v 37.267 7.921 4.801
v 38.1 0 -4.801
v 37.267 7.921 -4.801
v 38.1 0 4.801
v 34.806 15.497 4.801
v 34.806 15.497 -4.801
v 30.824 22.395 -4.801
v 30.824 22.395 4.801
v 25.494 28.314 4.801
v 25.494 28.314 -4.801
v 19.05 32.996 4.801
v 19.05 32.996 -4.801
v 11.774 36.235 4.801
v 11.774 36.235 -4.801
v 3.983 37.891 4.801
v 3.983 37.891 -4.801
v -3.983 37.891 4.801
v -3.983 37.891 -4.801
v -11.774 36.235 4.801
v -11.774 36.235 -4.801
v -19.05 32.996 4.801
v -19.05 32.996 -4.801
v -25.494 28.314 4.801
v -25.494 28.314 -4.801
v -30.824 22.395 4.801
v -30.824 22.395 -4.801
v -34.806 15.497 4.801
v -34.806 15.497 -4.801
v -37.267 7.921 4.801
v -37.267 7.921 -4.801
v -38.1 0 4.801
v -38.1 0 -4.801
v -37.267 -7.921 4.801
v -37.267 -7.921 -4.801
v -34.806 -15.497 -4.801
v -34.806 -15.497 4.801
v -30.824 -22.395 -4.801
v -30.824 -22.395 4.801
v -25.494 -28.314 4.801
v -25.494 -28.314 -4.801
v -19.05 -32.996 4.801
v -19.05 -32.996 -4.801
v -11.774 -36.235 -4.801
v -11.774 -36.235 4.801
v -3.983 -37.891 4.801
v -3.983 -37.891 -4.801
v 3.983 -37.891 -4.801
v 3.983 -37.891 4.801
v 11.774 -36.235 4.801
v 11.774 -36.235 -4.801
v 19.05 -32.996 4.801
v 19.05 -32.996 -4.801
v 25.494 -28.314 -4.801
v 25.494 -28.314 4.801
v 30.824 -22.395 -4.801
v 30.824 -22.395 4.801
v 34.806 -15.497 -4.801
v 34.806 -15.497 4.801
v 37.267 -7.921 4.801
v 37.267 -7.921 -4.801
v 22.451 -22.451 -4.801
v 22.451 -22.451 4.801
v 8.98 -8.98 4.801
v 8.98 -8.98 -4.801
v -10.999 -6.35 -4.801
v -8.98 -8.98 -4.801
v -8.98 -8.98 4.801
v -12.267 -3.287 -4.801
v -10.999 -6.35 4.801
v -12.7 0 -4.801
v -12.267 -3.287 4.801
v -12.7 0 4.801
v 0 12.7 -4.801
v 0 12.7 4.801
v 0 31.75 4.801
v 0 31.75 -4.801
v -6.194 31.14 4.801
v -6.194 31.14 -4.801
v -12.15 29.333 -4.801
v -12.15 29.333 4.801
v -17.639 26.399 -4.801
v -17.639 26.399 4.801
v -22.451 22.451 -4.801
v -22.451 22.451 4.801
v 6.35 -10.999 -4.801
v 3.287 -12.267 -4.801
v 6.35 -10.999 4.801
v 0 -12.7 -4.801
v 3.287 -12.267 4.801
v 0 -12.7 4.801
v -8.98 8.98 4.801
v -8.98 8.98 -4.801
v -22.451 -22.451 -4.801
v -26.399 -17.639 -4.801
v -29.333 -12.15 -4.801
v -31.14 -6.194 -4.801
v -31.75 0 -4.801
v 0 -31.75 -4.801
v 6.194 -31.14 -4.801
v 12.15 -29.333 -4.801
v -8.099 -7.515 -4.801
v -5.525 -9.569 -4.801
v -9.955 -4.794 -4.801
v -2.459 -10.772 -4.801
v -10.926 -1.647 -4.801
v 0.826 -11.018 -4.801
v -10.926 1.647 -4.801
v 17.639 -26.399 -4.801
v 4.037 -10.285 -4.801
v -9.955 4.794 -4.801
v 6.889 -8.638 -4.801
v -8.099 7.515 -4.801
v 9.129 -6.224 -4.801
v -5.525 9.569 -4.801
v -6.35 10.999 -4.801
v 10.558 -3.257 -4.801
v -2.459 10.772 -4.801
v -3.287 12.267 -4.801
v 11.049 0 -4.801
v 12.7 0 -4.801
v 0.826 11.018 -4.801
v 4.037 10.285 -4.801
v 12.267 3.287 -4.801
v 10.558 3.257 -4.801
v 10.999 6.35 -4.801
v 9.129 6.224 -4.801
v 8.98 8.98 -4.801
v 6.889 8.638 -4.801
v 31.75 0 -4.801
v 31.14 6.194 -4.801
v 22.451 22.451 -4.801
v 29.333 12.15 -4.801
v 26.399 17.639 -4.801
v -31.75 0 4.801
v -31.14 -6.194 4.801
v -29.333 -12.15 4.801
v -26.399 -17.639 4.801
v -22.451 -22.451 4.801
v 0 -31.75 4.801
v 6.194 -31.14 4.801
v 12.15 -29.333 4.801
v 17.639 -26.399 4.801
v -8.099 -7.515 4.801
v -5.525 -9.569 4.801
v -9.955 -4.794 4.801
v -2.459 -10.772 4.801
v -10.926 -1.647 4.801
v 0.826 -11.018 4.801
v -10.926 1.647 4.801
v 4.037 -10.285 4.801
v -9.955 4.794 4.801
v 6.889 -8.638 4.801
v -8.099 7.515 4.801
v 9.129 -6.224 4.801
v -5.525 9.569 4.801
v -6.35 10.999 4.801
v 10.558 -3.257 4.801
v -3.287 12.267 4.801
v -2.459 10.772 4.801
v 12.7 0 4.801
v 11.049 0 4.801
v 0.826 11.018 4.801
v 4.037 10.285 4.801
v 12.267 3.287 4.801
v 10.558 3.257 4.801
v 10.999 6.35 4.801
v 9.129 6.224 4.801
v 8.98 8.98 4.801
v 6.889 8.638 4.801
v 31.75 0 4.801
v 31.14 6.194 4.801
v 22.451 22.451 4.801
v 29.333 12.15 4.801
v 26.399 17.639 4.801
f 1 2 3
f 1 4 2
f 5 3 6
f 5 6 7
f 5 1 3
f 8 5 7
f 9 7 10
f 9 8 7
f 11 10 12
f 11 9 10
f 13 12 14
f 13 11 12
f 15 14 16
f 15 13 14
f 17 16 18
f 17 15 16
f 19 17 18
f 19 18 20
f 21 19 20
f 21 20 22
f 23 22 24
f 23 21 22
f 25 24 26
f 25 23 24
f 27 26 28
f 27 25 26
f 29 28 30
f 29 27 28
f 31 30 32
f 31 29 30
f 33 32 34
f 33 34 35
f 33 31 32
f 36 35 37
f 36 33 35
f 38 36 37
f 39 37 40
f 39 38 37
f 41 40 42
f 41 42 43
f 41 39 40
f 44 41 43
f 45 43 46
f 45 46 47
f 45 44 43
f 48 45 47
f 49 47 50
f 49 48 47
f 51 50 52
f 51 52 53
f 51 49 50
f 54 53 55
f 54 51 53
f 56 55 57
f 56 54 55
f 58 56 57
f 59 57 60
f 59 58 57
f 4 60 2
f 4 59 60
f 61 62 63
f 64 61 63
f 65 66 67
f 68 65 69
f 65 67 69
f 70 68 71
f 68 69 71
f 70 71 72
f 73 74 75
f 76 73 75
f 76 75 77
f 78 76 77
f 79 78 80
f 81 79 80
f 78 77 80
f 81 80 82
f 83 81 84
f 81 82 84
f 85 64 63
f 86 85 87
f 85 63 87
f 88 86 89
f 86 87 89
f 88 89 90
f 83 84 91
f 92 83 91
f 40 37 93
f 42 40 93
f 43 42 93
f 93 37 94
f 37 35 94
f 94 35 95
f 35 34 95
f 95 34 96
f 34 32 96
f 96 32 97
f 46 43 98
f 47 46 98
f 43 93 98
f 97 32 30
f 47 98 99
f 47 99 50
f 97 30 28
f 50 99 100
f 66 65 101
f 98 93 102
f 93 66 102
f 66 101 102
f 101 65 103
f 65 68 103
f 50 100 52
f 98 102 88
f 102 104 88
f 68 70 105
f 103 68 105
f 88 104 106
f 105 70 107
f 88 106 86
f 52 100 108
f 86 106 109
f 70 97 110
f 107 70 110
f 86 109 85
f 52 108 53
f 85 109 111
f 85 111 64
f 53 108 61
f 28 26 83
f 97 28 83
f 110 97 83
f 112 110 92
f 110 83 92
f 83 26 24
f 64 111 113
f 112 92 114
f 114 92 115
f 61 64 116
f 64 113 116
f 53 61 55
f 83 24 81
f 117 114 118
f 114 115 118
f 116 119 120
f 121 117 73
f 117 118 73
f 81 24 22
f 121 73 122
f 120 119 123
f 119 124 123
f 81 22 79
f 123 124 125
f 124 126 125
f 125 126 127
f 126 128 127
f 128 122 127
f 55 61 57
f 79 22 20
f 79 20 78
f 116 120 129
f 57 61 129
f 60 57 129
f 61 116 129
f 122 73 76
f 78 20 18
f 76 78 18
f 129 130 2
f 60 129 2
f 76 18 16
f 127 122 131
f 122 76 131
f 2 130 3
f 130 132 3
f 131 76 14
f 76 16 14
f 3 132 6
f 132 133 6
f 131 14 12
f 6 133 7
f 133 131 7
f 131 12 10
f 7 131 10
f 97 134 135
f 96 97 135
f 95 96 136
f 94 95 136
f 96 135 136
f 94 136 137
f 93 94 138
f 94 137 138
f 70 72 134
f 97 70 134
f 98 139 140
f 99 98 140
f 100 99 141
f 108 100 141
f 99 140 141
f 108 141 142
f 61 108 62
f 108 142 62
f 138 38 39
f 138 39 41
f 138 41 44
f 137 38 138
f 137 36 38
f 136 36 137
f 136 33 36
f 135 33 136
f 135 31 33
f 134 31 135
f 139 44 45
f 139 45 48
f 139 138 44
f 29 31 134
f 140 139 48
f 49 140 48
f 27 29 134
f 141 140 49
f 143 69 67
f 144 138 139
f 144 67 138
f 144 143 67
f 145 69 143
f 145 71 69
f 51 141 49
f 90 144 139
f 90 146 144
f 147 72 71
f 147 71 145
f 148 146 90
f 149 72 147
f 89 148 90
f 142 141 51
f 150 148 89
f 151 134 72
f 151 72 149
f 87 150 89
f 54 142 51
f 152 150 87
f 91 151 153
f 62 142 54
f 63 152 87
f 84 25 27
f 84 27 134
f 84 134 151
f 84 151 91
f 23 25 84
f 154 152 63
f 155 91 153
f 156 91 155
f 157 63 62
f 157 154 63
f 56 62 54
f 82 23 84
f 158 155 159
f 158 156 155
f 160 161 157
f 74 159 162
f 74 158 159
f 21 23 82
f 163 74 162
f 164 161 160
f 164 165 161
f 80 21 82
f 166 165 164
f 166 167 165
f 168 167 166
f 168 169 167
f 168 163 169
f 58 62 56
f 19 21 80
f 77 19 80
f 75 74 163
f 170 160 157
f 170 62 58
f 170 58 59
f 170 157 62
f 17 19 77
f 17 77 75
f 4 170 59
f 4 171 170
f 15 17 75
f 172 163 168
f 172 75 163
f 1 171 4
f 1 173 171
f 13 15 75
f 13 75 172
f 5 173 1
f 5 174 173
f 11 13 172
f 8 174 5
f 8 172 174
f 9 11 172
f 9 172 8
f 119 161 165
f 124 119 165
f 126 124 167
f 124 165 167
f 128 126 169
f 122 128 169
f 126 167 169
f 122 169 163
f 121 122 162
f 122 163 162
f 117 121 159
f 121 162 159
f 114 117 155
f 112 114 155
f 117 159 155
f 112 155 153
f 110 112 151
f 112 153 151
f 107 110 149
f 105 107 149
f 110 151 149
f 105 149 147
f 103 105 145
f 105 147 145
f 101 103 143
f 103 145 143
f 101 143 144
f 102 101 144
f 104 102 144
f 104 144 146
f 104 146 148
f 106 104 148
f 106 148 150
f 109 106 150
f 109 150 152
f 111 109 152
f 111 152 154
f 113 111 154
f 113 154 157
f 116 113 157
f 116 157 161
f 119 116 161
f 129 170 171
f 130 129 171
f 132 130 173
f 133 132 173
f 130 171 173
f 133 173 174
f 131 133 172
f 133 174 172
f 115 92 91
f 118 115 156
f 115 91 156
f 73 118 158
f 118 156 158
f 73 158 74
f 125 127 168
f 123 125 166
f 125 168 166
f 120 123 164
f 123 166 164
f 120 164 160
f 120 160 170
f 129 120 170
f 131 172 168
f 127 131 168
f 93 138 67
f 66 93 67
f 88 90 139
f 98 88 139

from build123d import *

# Parameters (mm, degrees)
F0_R     = 38.1
F1_DEPTH = 4.8006
F3_R     = 11.049
F4_DEPTH = 25.4
F5_DEPTH = 25.4


with BuildPart() as f1:
    # F0 (on Top) → F1 (new body, symmetric)
    with BuildSketch(Plane.XY):
        Circle(F0_R)
    extrude(amount=F1_DEPTH, both=True)

    # F3 (on face) → F4 (cut)
    with BuildSketch(Plane.XY.offset(4.8006)):
        Circle(F3_R)
    extrude(amount=-F4_DEPTH, mode=Mode.SUBTRACT)

    # F2 (on face) → F5 (cut)
    with BuildSketch(Plane.XY.offset(4.8006)):
        with BuildLine():
            ThreePointArc((17.9605122421, 17.9605122421), (23.4665401258, 9.7201591821), (25.4, 0))
            Line((25.4, 0), (31.75, 0))
            ThreePointArc((31.75, 0), (29.3331751572, 12.1501989776), (22.4506403027, 22.4506403027))
            Line((22.4506403027, 22.4506403027), (17.9605122421, 17.9605122421))
        make_face()
        with BuildLine():
            ThreePointArc((-17.9605122421, 17.9605122421), (-9.7201591821, 23.4665401258), (0, 25.4))
            Line((0, 25.4), (0, 31.75))
            ThreePointArc((0, 31.75), (-12.1501989776, 29.3331751572), (-22.4506403027, 22.4506403027))
            Line((-22.4506403027, 22.4506403027), (-17.9605122421, 17.9605122421))
        make_face()
        with BuildLine():
            Line((-22.4506403027, -22.4506403027), (-17.9605122421, -17.9605122421))
            ThreePointArc((-17.9605122421, -17.9605122421), (-23.4665401258, -9.7201591821), (-25.4, 0))
            Line((-25.4, 0), (-31.75, 0))
            ThreePointArc((-31.75, 0), (-29.3331751572, -12.1501989776), (-22.4506403027, -22.4506403027))
        make_face()
        with BuildLine():
            Line((22.4506403027, -22.4506403027), (17.9605122421, -17.9605122421))
            ThreePointArc((17.9605122421, -17.9605122421), (9.7201591821, -23.4665401258), (0, -25.4))
            Line((0, -25.4), (0, -31.75))
            ThreePointArc((0, -31.75), (12.1501989776, -29.3331751572), (22.4506403027, -22.4506403027))
        make_face()
        with BuildLine():
            Line((-13.4703841816, -13.4703841816), (-8.9802561211, -8.9802561211))
            ThreePointArc((-8.9802561211, -8.9802561211), (-11.7332700629, -4.860079591), (-12.7, 0))
            Line((-12.7, 0), (-19.05, 0))
            ThreePointArc((-19.05, 0), (-17.5999050943, -7.2901193866), (-13.4703841816, -13.4703841816))
        make_face()
        with BuildLine():
            ThreePointArc((-8.9802561211, 8.9802561211), (-4.860079591, 11.7332700629), (0, 12.7))
            Line((0, 12.7), (0, 19.05))
            ThreePointArc((0, 19.05), (-7.2901193866, 17.5999050943), (-13.4703841816, 13.4703841816))
            Line((-13.4703841816, 13.4703841816), (-8.9802561211, 8.9802561211))
        make_face()
        with BuildLine():
            ThreePointArc((8.9802561211, 8.9802561211), (11.7332700629, 4.860079591), (12.7, 0))
            Line((12.7, 0), (19.05, 0))
            ThreePointArc((19.05, 0), (17.5999050943, 7.2901193866), (13.4703841816, 13.4703841816))
            Line((13.4703841816, 13.4703841816), (8.9802561211, 8.9802561211))
        make_face()
        with BuildLine():
            Line((13.4703841816, -13.4703841816), (8.9802561211, -8.9802561211))
            ThreePointArc((8.9802561211, -8.9802561211), (4.860079591, -11.7332700629), (0, -12.7))
            Line((0, -12.7), (0, -19.05))
            ThreePointArc((0, -19.05), (7.2901193866, -17.5999050943), (13.4703841816, -13.4703841816))
        make_face()
        with BuildLine():
            ThreePointArc((-13.4703841816, 13.4703841816), (-7.2901193866, 17.5999050943), (0, 19.05))
            Line((0, 19.05), (0, 25.4))
            ThreePointArc((0, 25.4), (-9.7201591821, 23.4665401258), (-17.9605122421, 17.9605122421))
            Line((-17.9605122421, 17.9605122421), (-13.4703841816, 13.4703841816))
        make_face()
        with BuildLine():
            ThreePointArc((13.4703841816, 13.4703841816), (17.5999050943, 7.2901193866), (19.05, 0))
            Line((19.05, 0), (25.4, 0))
            ThreePointArc((25.4, 0), (23.4665401258, 9.7201591821), (17.9605122421, 17.9605122421))
            Line((17.9605122421, 17.9605122421), (13.4703841816, 13.4703841816))
        make_face()
        with BuildLine():
            Line((-17.9605122421, -17.9605122421), (-13.4703841816, -13.4703841816))
            ThreePointArc((-13.4703841816, -13.4703841816), (-17.5999050943, -7.2901193866), (-19.05, 0))
            Line((-19.05, 0), (-25.4, 0))
            ThreePointArc((-25.4, 0), (-23.4665401258, -9.7201591821), (-17.9605122421, -17.9605122421))
        make_face()
        with BuildLine():
            Line((17.9605122421, -17.9605122421), (13.4703841816, -13.4703841816))
            ThreePointArc((13.4703841816, -13.4703841816), (7.2901193866, -17.5999050943), (0, -19.05))
            Line((0, -19.05), (0, -25.4))
            ThreePointArc((0, -25.4), (9.7201591821, -23.4665401258), (17.9605122421, -17.9605122421))
        make_face()
    extrude(amount=-F5_DEPTH, mode=Mode.SUBTRACT)


solid = f1.part
